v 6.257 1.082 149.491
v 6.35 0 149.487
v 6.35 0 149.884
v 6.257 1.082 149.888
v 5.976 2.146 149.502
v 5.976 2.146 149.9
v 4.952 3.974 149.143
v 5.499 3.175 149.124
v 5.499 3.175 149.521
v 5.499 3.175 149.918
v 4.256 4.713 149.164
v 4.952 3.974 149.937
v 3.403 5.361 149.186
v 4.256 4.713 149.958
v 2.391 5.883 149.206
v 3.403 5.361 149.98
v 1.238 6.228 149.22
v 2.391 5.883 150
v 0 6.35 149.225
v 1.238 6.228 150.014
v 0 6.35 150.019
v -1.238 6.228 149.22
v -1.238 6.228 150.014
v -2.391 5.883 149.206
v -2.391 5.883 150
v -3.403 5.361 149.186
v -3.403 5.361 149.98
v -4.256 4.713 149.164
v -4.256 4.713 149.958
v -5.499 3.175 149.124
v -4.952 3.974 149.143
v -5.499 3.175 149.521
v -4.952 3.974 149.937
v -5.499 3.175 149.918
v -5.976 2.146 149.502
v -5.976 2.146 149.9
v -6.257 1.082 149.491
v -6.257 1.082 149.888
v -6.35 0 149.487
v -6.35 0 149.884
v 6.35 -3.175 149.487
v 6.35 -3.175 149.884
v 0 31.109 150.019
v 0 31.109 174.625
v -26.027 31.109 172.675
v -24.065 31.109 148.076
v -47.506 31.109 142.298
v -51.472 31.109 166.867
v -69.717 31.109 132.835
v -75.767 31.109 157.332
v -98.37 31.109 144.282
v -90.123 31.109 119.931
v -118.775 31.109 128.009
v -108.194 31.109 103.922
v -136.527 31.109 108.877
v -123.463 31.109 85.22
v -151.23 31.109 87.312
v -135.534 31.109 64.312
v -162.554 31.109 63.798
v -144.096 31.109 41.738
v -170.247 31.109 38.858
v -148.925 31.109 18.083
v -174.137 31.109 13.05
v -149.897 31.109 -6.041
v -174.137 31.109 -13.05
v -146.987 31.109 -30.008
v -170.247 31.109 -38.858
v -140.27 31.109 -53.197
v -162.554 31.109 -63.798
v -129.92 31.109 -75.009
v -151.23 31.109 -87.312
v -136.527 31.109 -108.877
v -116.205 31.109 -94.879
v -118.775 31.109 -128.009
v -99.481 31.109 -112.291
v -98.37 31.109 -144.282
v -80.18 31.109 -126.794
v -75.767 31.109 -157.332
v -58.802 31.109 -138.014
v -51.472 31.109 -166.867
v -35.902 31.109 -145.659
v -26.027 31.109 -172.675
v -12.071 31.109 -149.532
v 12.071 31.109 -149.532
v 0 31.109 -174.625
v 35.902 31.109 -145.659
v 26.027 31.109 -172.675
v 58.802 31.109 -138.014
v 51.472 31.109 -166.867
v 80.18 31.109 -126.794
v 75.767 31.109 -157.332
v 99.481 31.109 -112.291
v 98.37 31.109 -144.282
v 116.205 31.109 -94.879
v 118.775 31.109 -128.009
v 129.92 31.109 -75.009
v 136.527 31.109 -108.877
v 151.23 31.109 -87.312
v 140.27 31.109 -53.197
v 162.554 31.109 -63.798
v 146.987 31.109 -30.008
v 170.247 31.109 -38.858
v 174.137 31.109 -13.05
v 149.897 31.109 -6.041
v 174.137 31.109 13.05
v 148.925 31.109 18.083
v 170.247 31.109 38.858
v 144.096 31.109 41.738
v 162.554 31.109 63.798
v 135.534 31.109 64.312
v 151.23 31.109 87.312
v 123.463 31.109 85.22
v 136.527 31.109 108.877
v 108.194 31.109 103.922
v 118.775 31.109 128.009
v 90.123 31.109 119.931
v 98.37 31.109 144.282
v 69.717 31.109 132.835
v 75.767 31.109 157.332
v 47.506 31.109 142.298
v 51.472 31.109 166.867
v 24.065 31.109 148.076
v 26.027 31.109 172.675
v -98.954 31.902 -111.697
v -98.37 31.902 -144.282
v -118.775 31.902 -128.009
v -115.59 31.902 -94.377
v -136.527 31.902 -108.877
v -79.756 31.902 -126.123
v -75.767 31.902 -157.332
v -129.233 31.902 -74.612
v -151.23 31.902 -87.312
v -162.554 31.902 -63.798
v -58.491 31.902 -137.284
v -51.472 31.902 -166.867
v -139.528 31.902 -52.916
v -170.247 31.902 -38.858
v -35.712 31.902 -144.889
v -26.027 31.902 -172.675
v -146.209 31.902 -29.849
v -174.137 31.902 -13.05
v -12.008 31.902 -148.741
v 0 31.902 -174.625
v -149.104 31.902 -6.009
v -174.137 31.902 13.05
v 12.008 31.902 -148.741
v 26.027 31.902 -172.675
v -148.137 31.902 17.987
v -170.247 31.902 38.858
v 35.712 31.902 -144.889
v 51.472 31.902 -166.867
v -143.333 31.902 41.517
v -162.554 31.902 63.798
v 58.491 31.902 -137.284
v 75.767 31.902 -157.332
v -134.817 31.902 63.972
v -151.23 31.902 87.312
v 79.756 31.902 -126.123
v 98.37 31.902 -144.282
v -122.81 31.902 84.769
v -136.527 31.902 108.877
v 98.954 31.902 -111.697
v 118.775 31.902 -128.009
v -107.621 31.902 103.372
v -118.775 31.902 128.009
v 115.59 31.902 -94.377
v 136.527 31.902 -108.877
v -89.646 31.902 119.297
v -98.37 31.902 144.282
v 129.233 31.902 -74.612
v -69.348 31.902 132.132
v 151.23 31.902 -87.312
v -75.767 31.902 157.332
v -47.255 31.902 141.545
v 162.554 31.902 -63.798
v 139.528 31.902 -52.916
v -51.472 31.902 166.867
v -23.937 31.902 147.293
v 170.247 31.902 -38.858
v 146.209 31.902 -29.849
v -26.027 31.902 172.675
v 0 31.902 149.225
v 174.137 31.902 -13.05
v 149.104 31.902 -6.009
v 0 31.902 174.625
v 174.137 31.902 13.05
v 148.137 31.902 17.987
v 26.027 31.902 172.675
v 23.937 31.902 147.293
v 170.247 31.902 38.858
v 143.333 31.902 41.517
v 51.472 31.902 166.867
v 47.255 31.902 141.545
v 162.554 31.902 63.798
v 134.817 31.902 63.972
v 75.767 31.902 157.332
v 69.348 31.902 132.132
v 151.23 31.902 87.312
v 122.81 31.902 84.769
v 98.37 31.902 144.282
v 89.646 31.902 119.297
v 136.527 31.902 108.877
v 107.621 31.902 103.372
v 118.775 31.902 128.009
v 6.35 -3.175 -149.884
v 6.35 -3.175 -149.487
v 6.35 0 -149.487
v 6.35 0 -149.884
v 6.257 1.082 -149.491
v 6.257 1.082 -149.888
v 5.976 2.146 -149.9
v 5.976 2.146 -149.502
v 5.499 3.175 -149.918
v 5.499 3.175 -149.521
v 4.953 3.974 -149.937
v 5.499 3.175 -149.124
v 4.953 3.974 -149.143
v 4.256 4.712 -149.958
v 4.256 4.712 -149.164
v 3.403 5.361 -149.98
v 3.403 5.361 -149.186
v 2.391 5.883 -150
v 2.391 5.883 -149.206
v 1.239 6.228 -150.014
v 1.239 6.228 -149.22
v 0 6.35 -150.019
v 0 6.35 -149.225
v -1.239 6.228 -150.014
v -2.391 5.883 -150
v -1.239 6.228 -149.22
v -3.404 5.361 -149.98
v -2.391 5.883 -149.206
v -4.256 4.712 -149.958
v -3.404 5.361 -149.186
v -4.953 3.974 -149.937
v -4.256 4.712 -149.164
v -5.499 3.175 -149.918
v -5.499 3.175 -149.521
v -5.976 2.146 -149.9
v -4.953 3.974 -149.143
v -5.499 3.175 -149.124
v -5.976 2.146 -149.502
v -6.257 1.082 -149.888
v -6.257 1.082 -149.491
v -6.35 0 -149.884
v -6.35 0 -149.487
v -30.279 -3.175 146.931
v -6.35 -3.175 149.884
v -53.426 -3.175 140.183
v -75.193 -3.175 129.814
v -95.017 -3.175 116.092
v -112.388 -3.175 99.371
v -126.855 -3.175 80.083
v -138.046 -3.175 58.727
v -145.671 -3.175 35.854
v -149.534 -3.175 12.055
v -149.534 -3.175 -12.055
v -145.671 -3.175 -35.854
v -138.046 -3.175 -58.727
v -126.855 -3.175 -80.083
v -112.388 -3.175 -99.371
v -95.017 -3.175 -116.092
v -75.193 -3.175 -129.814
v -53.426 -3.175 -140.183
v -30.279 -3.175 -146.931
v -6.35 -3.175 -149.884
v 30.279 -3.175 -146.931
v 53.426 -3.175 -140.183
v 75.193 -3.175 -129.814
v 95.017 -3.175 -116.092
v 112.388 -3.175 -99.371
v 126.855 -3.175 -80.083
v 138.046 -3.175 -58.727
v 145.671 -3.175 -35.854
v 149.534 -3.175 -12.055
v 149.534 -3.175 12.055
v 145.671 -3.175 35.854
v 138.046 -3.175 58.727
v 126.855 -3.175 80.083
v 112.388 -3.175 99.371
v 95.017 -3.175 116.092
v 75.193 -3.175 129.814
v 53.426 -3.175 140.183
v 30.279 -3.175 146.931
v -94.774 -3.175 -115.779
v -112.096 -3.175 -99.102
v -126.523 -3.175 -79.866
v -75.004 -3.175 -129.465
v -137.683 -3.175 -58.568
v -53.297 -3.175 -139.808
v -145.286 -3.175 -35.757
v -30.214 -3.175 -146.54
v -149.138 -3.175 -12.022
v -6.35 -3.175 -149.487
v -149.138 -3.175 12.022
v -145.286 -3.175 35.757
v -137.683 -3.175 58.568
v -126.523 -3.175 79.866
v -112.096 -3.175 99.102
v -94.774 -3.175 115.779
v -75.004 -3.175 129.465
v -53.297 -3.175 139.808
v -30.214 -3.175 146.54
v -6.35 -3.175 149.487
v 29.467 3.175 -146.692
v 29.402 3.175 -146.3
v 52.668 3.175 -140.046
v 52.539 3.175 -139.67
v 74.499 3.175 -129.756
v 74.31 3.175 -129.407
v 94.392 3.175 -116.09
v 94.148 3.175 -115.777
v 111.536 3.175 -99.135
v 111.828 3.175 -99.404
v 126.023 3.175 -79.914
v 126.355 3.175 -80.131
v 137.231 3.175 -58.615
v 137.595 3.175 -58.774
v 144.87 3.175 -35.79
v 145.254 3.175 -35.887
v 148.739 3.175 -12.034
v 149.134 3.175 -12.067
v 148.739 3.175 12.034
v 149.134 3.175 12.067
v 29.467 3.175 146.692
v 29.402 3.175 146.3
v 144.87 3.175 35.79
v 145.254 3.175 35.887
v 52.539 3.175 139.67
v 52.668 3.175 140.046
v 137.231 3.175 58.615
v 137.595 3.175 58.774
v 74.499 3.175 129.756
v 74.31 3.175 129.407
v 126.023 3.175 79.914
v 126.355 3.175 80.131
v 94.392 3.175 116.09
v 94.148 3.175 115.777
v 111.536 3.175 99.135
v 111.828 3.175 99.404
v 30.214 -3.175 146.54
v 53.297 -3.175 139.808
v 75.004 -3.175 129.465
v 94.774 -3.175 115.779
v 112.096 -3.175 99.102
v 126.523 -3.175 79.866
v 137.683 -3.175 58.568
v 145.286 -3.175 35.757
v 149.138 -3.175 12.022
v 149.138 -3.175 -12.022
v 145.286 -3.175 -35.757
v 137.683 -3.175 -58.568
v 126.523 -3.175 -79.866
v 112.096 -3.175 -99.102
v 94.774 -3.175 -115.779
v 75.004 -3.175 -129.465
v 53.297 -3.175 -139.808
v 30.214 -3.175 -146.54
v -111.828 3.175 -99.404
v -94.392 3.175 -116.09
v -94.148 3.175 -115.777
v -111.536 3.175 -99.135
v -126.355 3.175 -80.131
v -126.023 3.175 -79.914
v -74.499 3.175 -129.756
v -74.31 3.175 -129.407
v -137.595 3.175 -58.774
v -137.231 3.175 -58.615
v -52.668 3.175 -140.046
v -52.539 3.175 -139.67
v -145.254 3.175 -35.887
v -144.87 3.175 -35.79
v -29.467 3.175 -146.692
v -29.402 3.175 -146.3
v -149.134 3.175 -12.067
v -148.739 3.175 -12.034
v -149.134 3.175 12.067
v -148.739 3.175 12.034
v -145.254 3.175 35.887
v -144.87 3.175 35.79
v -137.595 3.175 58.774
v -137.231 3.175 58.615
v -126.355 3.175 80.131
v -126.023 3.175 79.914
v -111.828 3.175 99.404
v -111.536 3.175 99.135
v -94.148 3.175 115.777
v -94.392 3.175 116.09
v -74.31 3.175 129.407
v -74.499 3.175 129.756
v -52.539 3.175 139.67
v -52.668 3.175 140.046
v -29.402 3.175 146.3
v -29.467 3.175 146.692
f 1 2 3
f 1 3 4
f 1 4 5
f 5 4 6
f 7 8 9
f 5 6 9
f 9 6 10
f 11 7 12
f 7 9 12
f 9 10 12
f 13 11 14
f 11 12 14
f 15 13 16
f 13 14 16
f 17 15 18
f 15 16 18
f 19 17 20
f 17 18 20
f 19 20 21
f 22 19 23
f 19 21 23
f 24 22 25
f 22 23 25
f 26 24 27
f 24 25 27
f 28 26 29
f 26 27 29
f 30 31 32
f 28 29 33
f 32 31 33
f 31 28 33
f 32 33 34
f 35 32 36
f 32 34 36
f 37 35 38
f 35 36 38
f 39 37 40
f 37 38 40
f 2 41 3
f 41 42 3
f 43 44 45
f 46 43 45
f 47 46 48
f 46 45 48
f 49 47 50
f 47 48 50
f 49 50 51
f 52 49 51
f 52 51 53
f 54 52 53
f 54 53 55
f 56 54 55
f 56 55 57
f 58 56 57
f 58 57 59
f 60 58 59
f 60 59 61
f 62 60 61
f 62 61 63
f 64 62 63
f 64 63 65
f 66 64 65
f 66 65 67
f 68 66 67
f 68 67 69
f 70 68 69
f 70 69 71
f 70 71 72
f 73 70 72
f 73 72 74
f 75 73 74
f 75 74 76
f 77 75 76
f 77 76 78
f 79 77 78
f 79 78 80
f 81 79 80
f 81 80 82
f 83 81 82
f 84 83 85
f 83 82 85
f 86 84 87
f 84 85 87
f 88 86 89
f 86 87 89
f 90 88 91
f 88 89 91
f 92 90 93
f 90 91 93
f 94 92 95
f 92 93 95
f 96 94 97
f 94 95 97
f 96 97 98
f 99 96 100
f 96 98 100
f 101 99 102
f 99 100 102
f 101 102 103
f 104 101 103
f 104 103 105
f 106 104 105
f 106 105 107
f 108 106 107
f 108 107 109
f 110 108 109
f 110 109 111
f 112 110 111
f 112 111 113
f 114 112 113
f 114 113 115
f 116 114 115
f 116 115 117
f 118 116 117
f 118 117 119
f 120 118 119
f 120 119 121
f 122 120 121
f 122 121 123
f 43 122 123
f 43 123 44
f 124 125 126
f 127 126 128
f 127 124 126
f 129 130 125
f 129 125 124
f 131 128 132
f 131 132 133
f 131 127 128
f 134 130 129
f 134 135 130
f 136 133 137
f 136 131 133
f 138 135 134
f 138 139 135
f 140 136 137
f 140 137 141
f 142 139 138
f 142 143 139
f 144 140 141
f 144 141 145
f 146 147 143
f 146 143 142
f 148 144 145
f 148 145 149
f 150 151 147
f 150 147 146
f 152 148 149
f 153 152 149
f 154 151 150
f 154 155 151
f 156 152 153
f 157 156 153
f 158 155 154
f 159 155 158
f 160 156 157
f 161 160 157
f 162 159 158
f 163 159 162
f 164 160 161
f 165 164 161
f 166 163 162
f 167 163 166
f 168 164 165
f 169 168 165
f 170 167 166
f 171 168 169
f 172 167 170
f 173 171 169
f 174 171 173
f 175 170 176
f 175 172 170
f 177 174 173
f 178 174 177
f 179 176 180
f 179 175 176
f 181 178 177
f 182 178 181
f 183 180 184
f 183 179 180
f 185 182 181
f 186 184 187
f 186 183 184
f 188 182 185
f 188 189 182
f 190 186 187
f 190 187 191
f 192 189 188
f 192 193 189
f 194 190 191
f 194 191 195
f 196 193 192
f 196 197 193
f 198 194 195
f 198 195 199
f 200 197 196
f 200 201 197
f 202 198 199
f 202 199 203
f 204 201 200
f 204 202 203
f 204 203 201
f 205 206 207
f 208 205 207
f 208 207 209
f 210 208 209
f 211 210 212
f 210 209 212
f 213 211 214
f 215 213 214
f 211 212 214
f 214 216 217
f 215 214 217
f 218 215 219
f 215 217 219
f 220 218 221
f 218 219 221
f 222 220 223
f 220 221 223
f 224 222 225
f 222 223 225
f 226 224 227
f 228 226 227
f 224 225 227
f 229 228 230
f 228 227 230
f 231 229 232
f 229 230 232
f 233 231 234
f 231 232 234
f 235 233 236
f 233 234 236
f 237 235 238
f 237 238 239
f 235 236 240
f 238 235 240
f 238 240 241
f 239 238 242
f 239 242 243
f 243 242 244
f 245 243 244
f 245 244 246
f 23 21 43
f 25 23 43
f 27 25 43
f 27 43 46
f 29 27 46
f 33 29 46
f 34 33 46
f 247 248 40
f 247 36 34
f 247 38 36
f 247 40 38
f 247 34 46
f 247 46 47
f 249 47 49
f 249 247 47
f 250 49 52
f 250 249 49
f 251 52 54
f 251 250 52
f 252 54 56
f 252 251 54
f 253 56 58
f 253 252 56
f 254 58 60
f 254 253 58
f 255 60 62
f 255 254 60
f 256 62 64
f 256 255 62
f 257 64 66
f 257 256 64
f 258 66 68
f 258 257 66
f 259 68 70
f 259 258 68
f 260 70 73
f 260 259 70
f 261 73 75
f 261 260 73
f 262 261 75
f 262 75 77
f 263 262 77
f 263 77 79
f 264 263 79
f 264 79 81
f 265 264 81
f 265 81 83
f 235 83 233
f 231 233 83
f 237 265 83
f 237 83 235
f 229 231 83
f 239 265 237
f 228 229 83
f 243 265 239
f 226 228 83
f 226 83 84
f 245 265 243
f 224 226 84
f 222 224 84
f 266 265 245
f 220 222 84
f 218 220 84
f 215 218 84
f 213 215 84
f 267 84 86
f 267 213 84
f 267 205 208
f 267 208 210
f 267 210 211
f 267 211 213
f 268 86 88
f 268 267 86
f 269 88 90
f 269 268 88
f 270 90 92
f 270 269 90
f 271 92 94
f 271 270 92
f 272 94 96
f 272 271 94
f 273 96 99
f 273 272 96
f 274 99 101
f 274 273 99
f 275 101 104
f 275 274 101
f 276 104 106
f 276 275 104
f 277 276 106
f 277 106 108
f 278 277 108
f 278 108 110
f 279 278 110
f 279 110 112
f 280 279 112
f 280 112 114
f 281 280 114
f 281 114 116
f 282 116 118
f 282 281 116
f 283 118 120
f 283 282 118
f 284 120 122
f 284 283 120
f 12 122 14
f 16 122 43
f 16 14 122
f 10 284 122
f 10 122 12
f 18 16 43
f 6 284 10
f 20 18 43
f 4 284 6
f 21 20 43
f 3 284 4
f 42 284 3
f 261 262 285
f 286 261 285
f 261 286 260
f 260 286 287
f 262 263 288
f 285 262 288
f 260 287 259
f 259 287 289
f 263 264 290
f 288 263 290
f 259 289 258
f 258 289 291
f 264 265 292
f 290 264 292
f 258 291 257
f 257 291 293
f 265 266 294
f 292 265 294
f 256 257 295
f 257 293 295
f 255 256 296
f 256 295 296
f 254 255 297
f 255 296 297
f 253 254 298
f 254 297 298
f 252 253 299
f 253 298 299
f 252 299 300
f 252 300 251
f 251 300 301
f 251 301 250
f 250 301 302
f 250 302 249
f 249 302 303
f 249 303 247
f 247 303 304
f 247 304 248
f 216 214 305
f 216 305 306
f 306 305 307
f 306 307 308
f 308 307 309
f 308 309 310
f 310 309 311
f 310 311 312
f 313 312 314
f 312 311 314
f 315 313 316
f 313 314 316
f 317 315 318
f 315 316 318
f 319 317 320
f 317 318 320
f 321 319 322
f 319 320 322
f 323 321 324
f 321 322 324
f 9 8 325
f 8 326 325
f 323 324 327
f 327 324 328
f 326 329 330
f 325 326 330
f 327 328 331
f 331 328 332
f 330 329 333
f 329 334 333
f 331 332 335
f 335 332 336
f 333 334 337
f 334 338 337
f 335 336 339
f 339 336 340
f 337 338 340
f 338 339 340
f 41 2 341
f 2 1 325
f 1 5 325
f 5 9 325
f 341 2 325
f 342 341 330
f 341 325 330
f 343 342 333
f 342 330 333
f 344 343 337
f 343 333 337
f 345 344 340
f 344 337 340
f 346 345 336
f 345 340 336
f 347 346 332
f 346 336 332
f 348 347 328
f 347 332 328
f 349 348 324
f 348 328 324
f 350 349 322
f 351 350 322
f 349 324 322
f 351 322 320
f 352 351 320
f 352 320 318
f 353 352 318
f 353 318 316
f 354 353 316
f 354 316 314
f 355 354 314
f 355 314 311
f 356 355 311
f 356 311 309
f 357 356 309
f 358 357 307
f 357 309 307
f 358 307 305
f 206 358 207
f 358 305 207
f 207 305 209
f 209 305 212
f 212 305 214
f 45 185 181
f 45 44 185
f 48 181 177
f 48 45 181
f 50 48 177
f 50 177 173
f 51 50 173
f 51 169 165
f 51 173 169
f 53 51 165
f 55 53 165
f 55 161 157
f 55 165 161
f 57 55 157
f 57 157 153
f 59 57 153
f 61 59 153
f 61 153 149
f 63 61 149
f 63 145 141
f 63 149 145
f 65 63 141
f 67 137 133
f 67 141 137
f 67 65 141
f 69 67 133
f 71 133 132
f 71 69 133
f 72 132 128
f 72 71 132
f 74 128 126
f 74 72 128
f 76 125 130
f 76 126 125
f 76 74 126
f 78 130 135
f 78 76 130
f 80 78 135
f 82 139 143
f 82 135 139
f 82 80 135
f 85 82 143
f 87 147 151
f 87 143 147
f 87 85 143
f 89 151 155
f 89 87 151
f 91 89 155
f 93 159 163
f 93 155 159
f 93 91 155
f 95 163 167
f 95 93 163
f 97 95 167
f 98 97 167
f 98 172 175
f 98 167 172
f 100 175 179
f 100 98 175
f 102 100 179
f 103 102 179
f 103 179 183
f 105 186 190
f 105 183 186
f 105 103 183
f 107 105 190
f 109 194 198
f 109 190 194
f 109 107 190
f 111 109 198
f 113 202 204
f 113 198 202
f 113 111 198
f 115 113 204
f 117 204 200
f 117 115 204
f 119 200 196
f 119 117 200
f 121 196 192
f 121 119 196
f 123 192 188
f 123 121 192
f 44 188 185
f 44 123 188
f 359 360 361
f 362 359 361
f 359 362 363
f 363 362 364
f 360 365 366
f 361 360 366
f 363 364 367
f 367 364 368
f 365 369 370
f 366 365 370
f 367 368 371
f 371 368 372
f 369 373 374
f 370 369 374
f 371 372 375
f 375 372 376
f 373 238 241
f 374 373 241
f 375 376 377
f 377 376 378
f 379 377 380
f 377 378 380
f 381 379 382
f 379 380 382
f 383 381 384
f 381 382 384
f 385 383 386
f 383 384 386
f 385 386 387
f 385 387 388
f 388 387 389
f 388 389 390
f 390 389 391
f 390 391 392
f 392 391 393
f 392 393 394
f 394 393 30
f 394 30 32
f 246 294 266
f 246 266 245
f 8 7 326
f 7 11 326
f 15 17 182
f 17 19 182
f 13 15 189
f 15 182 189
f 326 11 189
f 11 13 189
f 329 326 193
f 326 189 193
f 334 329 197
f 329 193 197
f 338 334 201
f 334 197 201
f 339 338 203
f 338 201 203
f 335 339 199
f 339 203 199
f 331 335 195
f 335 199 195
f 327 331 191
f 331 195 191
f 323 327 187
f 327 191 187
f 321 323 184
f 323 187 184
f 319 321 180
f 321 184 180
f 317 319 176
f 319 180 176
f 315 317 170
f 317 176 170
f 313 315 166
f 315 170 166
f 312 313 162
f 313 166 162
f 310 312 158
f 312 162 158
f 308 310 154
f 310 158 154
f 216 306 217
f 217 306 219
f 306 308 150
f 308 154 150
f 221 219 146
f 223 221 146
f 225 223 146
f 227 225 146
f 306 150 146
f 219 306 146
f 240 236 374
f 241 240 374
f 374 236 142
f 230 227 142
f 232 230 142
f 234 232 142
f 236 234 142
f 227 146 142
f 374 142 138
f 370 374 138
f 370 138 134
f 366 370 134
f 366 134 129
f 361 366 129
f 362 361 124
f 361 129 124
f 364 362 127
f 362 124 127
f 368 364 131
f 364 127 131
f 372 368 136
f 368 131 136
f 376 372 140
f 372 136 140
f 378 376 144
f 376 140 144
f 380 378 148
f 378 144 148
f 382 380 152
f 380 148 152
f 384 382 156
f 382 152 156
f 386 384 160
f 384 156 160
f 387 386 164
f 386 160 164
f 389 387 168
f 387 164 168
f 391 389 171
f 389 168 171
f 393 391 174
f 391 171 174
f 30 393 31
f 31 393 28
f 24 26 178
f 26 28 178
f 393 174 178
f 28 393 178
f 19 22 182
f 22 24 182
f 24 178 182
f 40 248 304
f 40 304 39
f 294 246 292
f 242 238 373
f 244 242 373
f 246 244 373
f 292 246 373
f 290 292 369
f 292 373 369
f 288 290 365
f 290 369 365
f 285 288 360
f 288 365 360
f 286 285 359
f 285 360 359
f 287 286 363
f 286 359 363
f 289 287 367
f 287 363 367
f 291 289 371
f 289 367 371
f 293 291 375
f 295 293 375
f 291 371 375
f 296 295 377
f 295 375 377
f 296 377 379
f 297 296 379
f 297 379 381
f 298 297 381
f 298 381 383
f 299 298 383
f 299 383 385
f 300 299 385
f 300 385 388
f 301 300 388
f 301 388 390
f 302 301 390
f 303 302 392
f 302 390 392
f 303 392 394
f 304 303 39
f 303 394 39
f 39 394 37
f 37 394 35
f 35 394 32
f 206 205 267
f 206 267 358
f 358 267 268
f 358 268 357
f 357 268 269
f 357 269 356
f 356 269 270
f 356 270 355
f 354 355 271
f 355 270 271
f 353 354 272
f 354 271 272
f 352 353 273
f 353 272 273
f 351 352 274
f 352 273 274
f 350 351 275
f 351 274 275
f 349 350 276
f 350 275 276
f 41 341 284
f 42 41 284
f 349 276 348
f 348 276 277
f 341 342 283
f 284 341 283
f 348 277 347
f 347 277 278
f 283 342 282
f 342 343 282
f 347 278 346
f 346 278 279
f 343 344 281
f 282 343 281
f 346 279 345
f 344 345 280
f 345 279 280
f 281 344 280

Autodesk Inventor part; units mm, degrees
ref_plane "YZ Plane" through (0, 0, 0) normal (1, 0, 0) x (0, 1, 0)
ref_plane "XZ Plane" through (0, 0, 0) normal (0, 1, 0) x (-1, 0, 0)
sketch "Sketch1" plane through (0, 0, 0) normal (1, 0, 0) x (0, 1, 0)
  line L0 (0, 0) -> (0.4853, 0)
  line L1 (3.175, 149.225) -> (31.9024, 149.225)
  line L2 (31.9024, 149.225) -> (31.9024, 174.625)
  line L3 (31.9024, 174.625) -> (31.1086, 174.625)
  line L4 (31.1086, 174.625) -> (31.1087, 150.0187)
  line L5 (31.1087, 150.0187) -> (3.175, 150.0187)
  line L6 (0, 149.225) -> (-3.175, 149.225)
  line L7 (-3.175, 149.6219) -> (3.175, 149.6219)
  line L8 (3.175, 150.0187) -> (-3.175, 150.0187)
  line L9 (-3.175, 150.0187) -> (-3.175, 149.6219)
  line L10 (3.175, 149.6219) -> (3.175, 149.225)
  point P0 (31.4127, 174.625)
  dimension "d0" = 31.9024
  dimension "d1" = 149.225
  dimension "d2" = 25.4
  dimension "d3" = 0.7937
  dimension "d4" = 24.6062
  dimension "d5" = 3.175
  dimension "d6" = 0.3969
revolve "Revolution1" add sketch "Sketch1" angle 360 about axis through (0, 0, 0) along (0, 1, 0)
ref_plane "Work Plane1" through (0, 31.4127, 174.625) normal (0, 0, 1) x (1, 0, 0)
sketch "Sketch2" plane through (0, 31.4127, 174.625) normal (0, 0, 1) x (1, 0, 0)
  line L0 (149.6219, -34.5877) -> (-149.6219, -34.5877) projected
  arc A0 (6.35, -31.4127) -> (-6.35, -31.4127) centre (0, -31.4127) ccw
  line L1 (-6.35, -34.5877) -> (-6.35, -31.4127)
  line L2 (6.35, -34.5877) -> (6.35, -31.4127)
  line L3 (-6.35, -34.5877) -> (6.35, -34.5877)
  point P0 (0, -31.4127)
  dimension "d10" = 12.7
  dimension "d11" = 0
  dimension "d12" = 3.175
extrude "Extrusion1" cut sketch "Sketch2" against normal through all
properties part number "Layer2_Top"
